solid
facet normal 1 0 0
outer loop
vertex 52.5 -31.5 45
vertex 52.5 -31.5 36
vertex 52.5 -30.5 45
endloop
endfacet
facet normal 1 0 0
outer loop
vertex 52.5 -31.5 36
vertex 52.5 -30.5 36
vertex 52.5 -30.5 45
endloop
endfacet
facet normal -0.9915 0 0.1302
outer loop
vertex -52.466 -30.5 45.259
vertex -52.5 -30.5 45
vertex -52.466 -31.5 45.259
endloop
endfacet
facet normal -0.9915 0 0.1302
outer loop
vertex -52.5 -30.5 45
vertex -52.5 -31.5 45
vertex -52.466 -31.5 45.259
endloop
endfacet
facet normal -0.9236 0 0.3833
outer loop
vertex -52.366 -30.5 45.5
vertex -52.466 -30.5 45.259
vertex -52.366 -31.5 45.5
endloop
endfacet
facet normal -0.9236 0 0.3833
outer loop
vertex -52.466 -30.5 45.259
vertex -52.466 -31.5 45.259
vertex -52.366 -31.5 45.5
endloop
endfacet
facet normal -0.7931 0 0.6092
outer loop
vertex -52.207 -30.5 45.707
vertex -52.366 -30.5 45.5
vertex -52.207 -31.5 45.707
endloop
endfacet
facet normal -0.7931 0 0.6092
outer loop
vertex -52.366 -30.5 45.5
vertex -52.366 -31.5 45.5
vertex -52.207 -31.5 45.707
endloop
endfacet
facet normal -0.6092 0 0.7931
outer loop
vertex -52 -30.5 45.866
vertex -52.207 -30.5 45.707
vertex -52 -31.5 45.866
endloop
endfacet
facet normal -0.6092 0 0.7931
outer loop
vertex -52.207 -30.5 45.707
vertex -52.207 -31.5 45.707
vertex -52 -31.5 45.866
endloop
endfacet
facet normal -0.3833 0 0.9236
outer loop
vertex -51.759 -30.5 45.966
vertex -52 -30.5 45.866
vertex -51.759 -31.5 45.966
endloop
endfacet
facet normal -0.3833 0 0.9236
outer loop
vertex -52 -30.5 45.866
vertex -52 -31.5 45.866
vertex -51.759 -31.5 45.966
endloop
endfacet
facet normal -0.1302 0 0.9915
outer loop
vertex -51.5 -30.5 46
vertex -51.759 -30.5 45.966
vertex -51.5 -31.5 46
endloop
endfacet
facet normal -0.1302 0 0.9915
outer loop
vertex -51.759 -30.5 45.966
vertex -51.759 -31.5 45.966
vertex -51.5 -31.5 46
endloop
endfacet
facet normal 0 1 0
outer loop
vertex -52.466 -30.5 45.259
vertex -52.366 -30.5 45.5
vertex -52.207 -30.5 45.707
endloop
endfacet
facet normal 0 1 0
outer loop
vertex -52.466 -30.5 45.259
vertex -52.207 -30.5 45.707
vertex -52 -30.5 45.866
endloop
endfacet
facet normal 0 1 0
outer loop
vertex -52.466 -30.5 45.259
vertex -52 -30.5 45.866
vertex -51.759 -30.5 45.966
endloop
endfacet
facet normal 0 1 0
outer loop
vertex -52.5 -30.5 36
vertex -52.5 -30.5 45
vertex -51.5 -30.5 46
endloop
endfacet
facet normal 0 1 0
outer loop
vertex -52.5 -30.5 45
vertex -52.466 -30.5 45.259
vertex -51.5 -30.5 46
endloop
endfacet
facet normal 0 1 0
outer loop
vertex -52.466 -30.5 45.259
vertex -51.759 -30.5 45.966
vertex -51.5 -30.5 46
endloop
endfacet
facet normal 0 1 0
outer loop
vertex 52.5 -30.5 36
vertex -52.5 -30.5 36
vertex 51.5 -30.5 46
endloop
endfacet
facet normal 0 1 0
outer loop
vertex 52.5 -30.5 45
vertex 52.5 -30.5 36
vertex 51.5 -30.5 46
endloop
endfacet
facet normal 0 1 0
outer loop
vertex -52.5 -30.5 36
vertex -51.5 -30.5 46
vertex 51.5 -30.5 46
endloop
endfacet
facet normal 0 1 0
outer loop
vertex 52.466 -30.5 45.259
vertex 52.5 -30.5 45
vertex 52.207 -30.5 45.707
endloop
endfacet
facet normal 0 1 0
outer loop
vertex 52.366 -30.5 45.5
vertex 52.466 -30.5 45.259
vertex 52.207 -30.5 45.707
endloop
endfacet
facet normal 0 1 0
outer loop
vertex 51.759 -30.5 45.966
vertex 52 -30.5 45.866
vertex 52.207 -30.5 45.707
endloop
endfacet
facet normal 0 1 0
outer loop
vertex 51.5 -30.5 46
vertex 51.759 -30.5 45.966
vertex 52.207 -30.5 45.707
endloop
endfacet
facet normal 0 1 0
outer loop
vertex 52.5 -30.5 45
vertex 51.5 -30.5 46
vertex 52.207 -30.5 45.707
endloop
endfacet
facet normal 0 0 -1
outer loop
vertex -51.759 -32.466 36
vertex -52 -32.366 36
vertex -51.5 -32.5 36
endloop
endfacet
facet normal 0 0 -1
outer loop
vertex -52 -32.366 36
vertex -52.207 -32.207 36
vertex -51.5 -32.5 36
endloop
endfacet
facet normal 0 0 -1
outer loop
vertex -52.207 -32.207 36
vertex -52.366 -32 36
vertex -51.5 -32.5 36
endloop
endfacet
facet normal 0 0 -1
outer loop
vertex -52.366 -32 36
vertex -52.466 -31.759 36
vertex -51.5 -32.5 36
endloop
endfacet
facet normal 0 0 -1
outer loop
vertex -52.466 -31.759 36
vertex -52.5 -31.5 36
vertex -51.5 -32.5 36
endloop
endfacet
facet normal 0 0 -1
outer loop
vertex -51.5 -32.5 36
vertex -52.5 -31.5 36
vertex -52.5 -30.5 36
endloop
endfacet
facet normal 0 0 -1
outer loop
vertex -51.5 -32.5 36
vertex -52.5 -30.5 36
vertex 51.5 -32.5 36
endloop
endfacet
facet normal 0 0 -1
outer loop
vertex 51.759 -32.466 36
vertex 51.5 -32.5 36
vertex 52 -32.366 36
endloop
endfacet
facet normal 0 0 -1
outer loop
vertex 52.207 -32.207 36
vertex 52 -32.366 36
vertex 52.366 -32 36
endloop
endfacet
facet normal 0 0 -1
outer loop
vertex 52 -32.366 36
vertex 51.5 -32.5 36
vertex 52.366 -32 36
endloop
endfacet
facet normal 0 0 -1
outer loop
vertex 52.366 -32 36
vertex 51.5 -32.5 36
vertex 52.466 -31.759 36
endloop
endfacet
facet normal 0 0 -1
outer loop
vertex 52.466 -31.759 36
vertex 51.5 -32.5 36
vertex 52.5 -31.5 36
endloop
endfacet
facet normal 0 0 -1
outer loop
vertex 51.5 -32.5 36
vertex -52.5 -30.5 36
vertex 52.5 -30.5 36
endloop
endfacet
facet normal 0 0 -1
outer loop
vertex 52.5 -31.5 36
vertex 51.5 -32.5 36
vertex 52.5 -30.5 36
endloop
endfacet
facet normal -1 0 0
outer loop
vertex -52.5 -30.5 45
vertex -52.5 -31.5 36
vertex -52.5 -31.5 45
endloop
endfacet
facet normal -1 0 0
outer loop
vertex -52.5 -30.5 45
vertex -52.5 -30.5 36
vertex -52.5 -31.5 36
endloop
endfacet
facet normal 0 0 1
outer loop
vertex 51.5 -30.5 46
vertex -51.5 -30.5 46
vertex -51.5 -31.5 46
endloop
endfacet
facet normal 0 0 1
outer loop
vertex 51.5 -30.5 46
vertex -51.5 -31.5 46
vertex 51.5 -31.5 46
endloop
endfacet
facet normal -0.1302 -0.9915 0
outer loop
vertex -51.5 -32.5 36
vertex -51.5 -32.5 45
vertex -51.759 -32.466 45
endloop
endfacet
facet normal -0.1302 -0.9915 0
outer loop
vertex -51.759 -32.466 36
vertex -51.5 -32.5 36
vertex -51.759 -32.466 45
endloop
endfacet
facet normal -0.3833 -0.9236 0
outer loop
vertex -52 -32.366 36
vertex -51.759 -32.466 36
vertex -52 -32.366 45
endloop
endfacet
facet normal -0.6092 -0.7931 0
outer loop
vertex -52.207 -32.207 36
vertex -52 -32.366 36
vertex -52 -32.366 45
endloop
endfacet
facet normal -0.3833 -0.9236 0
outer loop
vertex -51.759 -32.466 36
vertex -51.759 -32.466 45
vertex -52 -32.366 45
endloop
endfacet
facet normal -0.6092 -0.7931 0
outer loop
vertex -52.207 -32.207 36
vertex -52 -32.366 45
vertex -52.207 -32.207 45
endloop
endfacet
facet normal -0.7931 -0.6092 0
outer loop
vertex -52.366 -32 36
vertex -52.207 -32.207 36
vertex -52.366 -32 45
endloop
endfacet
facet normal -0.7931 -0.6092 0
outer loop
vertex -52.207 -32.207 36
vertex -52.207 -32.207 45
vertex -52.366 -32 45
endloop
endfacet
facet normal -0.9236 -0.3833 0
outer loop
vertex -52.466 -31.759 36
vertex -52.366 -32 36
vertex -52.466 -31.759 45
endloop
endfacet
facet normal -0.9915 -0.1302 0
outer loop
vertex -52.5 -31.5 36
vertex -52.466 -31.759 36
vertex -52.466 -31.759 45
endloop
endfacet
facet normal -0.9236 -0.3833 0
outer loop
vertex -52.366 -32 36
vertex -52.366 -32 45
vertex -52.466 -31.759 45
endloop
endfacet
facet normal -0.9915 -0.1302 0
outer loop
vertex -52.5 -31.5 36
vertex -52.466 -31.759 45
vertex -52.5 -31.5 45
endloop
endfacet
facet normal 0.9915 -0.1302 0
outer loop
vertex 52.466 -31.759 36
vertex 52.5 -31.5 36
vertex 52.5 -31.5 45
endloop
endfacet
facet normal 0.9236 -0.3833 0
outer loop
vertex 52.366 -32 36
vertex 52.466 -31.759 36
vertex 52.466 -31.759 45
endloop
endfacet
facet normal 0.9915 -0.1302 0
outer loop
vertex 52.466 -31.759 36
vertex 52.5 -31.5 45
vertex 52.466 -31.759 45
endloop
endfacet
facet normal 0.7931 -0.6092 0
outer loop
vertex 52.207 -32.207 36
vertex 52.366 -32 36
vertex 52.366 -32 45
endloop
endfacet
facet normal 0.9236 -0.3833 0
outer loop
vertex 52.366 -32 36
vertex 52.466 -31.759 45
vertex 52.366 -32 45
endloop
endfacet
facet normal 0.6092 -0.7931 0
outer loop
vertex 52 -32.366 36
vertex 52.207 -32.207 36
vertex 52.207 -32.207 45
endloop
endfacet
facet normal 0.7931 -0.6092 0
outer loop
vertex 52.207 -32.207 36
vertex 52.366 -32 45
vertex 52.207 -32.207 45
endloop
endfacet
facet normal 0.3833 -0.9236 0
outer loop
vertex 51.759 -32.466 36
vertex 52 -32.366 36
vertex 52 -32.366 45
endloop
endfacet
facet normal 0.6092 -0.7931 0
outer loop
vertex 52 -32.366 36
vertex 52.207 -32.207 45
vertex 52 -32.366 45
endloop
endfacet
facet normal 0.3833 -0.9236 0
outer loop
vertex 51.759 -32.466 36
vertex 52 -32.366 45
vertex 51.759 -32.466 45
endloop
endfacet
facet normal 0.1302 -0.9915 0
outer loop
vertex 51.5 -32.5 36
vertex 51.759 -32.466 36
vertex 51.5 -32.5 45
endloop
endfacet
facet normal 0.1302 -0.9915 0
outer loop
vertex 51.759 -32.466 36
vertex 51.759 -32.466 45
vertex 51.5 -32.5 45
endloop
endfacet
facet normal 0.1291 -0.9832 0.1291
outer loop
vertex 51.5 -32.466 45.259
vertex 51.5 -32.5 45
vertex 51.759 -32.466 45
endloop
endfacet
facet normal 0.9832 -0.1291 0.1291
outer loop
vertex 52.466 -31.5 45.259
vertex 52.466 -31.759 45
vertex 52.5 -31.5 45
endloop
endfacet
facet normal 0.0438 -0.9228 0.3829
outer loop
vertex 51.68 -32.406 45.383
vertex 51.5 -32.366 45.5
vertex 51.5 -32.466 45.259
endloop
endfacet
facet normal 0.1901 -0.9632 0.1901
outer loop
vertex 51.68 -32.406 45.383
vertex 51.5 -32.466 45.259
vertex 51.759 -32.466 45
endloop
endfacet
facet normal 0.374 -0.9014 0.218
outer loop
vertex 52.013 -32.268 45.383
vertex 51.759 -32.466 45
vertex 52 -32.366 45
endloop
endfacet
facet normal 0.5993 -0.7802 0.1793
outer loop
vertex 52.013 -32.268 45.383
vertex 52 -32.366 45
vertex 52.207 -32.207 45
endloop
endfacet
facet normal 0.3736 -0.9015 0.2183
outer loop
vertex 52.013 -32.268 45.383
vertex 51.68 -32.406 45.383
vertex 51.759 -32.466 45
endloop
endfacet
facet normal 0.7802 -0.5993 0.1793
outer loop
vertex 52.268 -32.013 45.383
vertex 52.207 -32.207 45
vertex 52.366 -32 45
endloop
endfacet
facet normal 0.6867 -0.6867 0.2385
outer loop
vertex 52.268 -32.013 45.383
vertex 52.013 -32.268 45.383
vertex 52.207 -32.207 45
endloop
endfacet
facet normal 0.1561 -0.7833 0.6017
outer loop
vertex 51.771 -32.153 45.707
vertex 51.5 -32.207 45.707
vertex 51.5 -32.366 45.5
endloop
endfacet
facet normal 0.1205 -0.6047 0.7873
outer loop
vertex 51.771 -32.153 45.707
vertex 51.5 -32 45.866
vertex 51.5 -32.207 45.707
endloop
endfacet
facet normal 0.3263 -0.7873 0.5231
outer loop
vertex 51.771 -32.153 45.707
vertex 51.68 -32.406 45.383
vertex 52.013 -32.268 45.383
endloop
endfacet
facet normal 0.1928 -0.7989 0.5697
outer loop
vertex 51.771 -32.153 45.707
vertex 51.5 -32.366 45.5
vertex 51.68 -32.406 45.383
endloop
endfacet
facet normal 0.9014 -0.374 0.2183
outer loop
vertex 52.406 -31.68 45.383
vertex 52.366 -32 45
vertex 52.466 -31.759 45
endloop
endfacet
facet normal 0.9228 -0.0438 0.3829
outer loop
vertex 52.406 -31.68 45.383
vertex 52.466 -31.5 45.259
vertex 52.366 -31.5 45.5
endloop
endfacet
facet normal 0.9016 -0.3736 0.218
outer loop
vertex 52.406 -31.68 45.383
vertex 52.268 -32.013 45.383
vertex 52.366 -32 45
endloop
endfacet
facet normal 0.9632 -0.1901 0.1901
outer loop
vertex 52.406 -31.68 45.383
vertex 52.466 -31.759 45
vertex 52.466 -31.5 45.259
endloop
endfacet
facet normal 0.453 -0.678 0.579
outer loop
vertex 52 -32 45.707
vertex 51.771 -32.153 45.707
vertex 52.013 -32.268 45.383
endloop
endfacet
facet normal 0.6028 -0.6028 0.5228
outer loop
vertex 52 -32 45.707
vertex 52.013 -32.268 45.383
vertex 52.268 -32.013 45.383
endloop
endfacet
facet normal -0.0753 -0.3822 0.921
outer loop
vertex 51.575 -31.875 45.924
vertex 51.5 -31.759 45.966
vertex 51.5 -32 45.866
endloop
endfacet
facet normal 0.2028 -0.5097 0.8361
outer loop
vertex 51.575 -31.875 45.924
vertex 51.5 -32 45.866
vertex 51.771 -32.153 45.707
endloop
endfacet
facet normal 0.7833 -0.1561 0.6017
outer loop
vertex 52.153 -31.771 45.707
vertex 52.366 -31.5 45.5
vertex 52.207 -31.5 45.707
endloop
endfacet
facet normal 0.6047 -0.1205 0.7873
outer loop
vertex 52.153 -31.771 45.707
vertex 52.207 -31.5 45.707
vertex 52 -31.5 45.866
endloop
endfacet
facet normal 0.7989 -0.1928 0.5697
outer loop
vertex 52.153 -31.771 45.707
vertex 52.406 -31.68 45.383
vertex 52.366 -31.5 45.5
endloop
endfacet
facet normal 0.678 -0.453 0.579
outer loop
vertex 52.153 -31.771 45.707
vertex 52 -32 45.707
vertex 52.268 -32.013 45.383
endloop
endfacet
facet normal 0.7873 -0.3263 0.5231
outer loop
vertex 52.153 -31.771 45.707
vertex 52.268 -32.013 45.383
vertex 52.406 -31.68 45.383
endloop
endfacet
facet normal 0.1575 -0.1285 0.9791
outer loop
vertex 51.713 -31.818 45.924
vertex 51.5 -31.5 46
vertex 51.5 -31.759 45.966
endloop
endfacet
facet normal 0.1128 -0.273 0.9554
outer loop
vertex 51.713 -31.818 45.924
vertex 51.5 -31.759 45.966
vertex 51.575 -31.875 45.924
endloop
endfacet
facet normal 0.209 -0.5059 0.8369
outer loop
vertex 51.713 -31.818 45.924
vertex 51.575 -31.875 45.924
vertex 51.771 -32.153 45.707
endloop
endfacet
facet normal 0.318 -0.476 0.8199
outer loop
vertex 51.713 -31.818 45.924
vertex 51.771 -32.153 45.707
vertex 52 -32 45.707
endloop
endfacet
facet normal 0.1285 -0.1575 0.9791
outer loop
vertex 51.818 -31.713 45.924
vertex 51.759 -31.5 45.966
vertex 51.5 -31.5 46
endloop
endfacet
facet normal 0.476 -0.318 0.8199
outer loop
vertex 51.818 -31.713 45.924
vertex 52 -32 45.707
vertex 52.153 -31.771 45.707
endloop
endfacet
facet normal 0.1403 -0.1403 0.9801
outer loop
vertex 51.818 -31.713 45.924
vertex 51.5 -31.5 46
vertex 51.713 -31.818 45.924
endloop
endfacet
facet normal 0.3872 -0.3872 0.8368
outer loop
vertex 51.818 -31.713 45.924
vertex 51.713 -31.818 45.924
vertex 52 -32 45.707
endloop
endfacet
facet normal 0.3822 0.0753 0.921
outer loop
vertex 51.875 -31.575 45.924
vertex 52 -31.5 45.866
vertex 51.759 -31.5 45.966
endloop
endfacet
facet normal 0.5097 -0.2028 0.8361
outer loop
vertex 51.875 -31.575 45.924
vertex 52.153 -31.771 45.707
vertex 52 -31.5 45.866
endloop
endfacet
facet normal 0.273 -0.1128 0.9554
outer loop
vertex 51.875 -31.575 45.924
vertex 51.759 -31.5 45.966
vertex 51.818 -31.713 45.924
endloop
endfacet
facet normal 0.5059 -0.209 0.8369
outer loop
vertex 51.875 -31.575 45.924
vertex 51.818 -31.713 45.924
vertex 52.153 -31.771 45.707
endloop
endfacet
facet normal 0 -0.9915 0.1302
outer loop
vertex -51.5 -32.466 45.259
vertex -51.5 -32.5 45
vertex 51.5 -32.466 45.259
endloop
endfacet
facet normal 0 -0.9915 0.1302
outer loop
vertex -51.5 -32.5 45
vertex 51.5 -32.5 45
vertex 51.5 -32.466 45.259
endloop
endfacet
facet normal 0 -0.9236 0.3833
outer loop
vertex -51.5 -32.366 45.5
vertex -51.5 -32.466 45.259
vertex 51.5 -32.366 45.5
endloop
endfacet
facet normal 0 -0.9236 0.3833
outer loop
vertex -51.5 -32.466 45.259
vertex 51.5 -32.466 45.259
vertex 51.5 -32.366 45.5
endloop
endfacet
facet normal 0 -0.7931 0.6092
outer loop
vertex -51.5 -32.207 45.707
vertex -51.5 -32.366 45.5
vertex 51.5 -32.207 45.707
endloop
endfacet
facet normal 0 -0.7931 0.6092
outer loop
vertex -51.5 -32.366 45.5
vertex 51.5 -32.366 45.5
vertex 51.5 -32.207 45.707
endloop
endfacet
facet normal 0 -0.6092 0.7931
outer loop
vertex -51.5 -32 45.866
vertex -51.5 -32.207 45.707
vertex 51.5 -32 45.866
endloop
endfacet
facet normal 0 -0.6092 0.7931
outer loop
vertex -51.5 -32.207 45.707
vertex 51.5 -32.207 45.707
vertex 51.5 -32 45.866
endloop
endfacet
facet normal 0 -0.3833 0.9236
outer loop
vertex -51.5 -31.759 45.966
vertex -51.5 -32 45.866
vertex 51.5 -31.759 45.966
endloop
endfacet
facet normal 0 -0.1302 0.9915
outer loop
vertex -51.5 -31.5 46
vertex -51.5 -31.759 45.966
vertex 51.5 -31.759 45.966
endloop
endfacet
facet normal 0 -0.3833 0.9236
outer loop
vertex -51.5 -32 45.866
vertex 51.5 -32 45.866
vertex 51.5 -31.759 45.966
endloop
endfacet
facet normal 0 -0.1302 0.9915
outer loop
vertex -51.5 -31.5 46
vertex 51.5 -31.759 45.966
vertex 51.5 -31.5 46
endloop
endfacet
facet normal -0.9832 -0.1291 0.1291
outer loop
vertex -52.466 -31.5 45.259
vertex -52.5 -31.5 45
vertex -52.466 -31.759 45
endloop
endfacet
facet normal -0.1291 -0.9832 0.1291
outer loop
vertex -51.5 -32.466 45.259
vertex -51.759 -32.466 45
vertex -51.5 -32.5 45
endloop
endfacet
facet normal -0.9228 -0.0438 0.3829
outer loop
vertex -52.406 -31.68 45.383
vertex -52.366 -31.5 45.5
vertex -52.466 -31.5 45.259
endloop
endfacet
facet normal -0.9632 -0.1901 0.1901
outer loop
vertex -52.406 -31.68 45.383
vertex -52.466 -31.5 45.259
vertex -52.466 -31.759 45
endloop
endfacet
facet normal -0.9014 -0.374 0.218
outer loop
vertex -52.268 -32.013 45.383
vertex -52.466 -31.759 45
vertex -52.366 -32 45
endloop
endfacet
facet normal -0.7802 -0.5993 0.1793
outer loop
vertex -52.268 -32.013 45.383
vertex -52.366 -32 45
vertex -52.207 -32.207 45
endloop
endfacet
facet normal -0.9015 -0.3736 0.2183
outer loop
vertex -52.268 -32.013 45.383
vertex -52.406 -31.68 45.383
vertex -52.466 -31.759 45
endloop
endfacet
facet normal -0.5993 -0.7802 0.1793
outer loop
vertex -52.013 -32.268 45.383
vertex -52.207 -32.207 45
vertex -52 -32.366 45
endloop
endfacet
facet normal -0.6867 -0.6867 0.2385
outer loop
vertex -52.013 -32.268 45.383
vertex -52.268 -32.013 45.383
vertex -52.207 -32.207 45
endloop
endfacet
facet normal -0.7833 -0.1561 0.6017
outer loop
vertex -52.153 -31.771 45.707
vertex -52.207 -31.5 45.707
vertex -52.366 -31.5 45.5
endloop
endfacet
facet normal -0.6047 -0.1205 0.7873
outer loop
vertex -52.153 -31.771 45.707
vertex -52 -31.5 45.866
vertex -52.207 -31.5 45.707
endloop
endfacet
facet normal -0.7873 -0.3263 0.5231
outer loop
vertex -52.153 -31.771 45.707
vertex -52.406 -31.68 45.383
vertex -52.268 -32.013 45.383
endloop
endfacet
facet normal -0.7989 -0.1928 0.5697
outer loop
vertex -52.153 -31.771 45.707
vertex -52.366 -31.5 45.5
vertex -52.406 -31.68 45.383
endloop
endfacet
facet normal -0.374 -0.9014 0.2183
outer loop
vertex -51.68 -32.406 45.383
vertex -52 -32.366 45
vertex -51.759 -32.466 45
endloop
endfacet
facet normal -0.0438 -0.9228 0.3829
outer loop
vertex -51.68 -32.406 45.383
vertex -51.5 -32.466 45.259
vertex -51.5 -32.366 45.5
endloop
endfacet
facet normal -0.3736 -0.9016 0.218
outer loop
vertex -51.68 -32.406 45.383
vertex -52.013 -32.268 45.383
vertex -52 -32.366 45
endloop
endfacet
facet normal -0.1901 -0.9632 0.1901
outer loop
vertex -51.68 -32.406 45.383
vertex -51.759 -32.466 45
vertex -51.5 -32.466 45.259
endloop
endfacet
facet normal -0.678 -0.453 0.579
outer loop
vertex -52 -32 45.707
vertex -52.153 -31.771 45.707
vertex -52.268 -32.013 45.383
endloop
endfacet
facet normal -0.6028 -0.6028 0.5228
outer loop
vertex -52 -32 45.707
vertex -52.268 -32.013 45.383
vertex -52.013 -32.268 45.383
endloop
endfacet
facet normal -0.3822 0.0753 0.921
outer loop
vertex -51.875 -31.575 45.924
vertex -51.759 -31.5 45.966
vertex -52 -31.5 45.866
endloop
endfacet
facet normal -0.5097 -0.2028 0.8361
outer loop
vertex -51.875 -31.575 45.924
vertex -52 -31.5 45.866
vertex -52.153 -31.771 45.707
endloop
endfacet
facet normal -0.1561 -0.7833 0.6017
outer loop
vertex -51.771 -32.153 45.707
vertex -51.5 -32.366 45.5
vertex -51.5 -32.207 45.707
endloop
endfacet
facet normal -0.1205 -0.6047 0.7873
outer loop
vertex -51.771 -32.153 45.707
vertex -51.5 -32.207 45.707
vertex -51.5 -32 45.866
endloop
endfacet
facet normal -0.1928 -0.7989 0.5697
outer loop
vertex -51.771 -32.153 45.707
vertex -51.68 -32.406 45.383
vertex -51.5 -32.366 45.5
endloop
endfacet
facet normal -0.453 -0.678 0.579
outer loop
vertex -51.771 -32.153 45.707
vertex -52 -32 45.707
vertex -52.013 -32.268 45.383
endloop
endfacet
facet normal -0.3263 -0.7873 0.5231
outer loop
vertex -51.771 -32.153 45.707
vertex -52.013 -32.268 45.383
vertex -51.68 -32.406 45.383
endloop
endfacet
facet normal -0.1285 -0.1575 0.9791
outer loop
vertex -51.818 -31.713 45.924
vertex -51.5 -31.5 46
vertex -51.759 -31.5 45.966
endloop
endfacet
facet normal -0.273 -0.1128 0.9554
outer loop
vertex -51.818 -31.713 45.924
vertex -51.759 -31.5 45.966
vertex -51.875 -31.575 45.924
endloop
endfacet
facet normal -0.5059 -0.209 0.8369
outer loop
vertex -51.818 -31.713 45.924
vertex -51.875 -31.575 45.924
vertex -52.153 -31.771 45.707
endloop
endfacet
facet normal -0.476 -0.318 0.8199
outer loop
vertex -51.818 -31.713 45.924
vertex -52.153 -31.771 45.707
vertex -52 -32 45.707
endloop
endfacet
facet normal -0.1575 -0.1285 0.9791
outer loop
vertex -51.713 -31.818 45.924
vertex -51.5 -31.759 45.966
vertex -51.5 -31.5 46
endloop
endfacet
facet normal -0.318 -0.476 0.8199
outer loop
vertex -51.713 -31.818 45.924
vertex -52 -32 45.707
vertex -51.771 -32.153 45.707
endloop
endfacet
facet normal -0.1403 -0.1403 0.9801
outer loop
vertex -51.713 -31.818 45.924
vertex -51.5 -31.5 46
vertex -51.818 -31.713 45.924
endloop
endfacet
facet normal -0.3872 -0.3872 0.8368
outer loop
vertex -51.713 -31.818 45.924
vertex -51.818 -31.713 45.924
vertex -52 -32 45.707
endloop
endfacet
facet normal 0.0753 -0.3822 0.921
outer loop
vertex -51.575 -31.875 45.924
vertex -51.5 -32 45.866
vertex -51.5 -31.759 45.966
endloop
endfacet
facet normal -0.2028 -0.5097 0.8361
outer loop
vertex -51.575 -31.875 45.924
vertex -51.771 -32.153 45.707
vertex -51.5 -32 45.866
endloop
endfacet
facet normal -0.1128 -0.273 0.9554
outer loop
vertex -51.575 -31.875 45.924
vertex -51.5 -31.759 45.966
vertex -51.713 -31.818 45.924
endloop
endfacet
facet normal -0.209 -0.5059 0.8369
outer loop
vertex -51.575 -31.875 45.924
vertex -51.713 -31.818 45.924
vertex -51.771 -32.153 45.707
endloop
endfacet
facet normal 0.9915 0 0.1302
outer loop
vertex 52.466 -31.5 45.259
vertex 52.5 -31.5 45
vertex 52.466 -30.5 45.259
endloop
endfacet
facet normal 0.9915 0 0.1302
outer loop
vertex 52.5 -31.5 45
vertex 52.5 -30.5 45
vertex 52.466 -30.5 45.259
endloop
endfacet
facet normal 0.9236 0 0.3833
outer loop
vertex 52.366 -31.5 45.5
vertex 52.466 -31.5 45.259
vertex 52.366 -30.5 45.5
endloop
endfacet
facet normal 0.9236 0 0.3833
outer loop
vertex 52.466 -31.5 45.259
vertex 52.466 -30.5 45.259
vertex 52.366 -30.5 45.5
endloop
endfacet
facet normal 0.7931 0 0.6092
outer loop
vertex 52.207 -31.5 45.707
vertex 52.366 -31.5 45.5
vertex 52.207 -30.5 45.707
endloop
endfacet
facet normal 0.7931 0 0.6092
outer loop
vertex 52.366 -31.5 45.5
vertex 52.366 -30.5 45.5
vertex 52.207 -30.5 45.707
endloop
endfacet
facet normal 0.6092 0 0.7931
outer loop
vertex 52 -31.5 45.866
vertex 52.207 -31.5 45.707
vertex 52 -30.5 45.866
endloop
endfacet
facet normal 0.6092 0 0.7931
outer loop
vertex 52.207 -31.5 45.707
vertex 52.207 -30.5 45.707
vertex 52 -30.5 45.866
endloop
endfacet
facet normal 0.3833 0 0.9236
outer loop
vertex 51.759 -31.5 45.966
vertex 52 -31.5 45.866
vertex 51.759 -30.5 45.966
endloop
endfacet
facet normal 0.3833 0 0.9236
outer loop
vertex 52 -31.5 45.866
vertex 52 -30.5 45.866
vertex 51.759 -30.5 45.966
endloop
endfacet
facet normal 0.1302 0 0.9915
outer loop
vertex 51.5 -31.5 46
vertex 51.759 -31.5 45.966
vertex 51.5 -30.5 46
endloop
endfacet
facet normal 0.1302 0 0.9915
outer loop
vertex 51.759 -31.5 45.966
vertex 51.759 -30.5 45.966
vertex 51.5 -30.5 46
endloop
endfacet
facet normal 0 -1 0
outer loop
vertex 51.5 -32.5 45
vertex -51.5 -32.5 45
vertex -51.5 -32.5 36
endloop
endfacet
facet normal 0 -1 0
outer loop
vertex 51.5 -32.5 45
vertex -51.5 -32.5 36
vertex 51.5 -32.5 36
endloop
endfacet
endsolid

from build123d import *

# Parameters (mm, degrees)
SKETCH007_W  = 105
SKETCH007_H  = 10
PAD006_DEPTH = 2
FILLET006_R  = 1
FILLET019_R  = 1
FILLET026_R  = 1


with BuildPart() as part:
    # Sketch007 → Pad006 (new body)
    with BuildSketch(Plane.XZ):
        with Locations((0, 5)):
            Rectangle(SKETCH007_W, SKETCH007_H)
    extrude(amount=PAD006_DEPTH)

    # Fillet006
    fillet006_edges = [part.edges().sort_by_distance(p)[0] for p in [
        (52.5, -2, 5),
    ]]
    fillet(fillet006_edges, radius=FILLET006_R)

    # Fillet019
    fillet019_edges = [part.edges().sort_by_distance(p)[0] for p in [
        (-52.5, -2, 5),
    ]]
    fillet(fillet019_edges, radius=FILLET019_R)

    # Fillet026
    fillet026_edges = [part.edges().sort_by_distance(p)[0] for p in [
        (0, -2, 10),
    ]]
    fillet(fillet026_edges, radius=FILLET026_R)


with BuildPart() as part_1:
    # Body006 placement: moved
    add(part.part.moved(Location((0, -30.5, 36))))


solid = part_1.part
